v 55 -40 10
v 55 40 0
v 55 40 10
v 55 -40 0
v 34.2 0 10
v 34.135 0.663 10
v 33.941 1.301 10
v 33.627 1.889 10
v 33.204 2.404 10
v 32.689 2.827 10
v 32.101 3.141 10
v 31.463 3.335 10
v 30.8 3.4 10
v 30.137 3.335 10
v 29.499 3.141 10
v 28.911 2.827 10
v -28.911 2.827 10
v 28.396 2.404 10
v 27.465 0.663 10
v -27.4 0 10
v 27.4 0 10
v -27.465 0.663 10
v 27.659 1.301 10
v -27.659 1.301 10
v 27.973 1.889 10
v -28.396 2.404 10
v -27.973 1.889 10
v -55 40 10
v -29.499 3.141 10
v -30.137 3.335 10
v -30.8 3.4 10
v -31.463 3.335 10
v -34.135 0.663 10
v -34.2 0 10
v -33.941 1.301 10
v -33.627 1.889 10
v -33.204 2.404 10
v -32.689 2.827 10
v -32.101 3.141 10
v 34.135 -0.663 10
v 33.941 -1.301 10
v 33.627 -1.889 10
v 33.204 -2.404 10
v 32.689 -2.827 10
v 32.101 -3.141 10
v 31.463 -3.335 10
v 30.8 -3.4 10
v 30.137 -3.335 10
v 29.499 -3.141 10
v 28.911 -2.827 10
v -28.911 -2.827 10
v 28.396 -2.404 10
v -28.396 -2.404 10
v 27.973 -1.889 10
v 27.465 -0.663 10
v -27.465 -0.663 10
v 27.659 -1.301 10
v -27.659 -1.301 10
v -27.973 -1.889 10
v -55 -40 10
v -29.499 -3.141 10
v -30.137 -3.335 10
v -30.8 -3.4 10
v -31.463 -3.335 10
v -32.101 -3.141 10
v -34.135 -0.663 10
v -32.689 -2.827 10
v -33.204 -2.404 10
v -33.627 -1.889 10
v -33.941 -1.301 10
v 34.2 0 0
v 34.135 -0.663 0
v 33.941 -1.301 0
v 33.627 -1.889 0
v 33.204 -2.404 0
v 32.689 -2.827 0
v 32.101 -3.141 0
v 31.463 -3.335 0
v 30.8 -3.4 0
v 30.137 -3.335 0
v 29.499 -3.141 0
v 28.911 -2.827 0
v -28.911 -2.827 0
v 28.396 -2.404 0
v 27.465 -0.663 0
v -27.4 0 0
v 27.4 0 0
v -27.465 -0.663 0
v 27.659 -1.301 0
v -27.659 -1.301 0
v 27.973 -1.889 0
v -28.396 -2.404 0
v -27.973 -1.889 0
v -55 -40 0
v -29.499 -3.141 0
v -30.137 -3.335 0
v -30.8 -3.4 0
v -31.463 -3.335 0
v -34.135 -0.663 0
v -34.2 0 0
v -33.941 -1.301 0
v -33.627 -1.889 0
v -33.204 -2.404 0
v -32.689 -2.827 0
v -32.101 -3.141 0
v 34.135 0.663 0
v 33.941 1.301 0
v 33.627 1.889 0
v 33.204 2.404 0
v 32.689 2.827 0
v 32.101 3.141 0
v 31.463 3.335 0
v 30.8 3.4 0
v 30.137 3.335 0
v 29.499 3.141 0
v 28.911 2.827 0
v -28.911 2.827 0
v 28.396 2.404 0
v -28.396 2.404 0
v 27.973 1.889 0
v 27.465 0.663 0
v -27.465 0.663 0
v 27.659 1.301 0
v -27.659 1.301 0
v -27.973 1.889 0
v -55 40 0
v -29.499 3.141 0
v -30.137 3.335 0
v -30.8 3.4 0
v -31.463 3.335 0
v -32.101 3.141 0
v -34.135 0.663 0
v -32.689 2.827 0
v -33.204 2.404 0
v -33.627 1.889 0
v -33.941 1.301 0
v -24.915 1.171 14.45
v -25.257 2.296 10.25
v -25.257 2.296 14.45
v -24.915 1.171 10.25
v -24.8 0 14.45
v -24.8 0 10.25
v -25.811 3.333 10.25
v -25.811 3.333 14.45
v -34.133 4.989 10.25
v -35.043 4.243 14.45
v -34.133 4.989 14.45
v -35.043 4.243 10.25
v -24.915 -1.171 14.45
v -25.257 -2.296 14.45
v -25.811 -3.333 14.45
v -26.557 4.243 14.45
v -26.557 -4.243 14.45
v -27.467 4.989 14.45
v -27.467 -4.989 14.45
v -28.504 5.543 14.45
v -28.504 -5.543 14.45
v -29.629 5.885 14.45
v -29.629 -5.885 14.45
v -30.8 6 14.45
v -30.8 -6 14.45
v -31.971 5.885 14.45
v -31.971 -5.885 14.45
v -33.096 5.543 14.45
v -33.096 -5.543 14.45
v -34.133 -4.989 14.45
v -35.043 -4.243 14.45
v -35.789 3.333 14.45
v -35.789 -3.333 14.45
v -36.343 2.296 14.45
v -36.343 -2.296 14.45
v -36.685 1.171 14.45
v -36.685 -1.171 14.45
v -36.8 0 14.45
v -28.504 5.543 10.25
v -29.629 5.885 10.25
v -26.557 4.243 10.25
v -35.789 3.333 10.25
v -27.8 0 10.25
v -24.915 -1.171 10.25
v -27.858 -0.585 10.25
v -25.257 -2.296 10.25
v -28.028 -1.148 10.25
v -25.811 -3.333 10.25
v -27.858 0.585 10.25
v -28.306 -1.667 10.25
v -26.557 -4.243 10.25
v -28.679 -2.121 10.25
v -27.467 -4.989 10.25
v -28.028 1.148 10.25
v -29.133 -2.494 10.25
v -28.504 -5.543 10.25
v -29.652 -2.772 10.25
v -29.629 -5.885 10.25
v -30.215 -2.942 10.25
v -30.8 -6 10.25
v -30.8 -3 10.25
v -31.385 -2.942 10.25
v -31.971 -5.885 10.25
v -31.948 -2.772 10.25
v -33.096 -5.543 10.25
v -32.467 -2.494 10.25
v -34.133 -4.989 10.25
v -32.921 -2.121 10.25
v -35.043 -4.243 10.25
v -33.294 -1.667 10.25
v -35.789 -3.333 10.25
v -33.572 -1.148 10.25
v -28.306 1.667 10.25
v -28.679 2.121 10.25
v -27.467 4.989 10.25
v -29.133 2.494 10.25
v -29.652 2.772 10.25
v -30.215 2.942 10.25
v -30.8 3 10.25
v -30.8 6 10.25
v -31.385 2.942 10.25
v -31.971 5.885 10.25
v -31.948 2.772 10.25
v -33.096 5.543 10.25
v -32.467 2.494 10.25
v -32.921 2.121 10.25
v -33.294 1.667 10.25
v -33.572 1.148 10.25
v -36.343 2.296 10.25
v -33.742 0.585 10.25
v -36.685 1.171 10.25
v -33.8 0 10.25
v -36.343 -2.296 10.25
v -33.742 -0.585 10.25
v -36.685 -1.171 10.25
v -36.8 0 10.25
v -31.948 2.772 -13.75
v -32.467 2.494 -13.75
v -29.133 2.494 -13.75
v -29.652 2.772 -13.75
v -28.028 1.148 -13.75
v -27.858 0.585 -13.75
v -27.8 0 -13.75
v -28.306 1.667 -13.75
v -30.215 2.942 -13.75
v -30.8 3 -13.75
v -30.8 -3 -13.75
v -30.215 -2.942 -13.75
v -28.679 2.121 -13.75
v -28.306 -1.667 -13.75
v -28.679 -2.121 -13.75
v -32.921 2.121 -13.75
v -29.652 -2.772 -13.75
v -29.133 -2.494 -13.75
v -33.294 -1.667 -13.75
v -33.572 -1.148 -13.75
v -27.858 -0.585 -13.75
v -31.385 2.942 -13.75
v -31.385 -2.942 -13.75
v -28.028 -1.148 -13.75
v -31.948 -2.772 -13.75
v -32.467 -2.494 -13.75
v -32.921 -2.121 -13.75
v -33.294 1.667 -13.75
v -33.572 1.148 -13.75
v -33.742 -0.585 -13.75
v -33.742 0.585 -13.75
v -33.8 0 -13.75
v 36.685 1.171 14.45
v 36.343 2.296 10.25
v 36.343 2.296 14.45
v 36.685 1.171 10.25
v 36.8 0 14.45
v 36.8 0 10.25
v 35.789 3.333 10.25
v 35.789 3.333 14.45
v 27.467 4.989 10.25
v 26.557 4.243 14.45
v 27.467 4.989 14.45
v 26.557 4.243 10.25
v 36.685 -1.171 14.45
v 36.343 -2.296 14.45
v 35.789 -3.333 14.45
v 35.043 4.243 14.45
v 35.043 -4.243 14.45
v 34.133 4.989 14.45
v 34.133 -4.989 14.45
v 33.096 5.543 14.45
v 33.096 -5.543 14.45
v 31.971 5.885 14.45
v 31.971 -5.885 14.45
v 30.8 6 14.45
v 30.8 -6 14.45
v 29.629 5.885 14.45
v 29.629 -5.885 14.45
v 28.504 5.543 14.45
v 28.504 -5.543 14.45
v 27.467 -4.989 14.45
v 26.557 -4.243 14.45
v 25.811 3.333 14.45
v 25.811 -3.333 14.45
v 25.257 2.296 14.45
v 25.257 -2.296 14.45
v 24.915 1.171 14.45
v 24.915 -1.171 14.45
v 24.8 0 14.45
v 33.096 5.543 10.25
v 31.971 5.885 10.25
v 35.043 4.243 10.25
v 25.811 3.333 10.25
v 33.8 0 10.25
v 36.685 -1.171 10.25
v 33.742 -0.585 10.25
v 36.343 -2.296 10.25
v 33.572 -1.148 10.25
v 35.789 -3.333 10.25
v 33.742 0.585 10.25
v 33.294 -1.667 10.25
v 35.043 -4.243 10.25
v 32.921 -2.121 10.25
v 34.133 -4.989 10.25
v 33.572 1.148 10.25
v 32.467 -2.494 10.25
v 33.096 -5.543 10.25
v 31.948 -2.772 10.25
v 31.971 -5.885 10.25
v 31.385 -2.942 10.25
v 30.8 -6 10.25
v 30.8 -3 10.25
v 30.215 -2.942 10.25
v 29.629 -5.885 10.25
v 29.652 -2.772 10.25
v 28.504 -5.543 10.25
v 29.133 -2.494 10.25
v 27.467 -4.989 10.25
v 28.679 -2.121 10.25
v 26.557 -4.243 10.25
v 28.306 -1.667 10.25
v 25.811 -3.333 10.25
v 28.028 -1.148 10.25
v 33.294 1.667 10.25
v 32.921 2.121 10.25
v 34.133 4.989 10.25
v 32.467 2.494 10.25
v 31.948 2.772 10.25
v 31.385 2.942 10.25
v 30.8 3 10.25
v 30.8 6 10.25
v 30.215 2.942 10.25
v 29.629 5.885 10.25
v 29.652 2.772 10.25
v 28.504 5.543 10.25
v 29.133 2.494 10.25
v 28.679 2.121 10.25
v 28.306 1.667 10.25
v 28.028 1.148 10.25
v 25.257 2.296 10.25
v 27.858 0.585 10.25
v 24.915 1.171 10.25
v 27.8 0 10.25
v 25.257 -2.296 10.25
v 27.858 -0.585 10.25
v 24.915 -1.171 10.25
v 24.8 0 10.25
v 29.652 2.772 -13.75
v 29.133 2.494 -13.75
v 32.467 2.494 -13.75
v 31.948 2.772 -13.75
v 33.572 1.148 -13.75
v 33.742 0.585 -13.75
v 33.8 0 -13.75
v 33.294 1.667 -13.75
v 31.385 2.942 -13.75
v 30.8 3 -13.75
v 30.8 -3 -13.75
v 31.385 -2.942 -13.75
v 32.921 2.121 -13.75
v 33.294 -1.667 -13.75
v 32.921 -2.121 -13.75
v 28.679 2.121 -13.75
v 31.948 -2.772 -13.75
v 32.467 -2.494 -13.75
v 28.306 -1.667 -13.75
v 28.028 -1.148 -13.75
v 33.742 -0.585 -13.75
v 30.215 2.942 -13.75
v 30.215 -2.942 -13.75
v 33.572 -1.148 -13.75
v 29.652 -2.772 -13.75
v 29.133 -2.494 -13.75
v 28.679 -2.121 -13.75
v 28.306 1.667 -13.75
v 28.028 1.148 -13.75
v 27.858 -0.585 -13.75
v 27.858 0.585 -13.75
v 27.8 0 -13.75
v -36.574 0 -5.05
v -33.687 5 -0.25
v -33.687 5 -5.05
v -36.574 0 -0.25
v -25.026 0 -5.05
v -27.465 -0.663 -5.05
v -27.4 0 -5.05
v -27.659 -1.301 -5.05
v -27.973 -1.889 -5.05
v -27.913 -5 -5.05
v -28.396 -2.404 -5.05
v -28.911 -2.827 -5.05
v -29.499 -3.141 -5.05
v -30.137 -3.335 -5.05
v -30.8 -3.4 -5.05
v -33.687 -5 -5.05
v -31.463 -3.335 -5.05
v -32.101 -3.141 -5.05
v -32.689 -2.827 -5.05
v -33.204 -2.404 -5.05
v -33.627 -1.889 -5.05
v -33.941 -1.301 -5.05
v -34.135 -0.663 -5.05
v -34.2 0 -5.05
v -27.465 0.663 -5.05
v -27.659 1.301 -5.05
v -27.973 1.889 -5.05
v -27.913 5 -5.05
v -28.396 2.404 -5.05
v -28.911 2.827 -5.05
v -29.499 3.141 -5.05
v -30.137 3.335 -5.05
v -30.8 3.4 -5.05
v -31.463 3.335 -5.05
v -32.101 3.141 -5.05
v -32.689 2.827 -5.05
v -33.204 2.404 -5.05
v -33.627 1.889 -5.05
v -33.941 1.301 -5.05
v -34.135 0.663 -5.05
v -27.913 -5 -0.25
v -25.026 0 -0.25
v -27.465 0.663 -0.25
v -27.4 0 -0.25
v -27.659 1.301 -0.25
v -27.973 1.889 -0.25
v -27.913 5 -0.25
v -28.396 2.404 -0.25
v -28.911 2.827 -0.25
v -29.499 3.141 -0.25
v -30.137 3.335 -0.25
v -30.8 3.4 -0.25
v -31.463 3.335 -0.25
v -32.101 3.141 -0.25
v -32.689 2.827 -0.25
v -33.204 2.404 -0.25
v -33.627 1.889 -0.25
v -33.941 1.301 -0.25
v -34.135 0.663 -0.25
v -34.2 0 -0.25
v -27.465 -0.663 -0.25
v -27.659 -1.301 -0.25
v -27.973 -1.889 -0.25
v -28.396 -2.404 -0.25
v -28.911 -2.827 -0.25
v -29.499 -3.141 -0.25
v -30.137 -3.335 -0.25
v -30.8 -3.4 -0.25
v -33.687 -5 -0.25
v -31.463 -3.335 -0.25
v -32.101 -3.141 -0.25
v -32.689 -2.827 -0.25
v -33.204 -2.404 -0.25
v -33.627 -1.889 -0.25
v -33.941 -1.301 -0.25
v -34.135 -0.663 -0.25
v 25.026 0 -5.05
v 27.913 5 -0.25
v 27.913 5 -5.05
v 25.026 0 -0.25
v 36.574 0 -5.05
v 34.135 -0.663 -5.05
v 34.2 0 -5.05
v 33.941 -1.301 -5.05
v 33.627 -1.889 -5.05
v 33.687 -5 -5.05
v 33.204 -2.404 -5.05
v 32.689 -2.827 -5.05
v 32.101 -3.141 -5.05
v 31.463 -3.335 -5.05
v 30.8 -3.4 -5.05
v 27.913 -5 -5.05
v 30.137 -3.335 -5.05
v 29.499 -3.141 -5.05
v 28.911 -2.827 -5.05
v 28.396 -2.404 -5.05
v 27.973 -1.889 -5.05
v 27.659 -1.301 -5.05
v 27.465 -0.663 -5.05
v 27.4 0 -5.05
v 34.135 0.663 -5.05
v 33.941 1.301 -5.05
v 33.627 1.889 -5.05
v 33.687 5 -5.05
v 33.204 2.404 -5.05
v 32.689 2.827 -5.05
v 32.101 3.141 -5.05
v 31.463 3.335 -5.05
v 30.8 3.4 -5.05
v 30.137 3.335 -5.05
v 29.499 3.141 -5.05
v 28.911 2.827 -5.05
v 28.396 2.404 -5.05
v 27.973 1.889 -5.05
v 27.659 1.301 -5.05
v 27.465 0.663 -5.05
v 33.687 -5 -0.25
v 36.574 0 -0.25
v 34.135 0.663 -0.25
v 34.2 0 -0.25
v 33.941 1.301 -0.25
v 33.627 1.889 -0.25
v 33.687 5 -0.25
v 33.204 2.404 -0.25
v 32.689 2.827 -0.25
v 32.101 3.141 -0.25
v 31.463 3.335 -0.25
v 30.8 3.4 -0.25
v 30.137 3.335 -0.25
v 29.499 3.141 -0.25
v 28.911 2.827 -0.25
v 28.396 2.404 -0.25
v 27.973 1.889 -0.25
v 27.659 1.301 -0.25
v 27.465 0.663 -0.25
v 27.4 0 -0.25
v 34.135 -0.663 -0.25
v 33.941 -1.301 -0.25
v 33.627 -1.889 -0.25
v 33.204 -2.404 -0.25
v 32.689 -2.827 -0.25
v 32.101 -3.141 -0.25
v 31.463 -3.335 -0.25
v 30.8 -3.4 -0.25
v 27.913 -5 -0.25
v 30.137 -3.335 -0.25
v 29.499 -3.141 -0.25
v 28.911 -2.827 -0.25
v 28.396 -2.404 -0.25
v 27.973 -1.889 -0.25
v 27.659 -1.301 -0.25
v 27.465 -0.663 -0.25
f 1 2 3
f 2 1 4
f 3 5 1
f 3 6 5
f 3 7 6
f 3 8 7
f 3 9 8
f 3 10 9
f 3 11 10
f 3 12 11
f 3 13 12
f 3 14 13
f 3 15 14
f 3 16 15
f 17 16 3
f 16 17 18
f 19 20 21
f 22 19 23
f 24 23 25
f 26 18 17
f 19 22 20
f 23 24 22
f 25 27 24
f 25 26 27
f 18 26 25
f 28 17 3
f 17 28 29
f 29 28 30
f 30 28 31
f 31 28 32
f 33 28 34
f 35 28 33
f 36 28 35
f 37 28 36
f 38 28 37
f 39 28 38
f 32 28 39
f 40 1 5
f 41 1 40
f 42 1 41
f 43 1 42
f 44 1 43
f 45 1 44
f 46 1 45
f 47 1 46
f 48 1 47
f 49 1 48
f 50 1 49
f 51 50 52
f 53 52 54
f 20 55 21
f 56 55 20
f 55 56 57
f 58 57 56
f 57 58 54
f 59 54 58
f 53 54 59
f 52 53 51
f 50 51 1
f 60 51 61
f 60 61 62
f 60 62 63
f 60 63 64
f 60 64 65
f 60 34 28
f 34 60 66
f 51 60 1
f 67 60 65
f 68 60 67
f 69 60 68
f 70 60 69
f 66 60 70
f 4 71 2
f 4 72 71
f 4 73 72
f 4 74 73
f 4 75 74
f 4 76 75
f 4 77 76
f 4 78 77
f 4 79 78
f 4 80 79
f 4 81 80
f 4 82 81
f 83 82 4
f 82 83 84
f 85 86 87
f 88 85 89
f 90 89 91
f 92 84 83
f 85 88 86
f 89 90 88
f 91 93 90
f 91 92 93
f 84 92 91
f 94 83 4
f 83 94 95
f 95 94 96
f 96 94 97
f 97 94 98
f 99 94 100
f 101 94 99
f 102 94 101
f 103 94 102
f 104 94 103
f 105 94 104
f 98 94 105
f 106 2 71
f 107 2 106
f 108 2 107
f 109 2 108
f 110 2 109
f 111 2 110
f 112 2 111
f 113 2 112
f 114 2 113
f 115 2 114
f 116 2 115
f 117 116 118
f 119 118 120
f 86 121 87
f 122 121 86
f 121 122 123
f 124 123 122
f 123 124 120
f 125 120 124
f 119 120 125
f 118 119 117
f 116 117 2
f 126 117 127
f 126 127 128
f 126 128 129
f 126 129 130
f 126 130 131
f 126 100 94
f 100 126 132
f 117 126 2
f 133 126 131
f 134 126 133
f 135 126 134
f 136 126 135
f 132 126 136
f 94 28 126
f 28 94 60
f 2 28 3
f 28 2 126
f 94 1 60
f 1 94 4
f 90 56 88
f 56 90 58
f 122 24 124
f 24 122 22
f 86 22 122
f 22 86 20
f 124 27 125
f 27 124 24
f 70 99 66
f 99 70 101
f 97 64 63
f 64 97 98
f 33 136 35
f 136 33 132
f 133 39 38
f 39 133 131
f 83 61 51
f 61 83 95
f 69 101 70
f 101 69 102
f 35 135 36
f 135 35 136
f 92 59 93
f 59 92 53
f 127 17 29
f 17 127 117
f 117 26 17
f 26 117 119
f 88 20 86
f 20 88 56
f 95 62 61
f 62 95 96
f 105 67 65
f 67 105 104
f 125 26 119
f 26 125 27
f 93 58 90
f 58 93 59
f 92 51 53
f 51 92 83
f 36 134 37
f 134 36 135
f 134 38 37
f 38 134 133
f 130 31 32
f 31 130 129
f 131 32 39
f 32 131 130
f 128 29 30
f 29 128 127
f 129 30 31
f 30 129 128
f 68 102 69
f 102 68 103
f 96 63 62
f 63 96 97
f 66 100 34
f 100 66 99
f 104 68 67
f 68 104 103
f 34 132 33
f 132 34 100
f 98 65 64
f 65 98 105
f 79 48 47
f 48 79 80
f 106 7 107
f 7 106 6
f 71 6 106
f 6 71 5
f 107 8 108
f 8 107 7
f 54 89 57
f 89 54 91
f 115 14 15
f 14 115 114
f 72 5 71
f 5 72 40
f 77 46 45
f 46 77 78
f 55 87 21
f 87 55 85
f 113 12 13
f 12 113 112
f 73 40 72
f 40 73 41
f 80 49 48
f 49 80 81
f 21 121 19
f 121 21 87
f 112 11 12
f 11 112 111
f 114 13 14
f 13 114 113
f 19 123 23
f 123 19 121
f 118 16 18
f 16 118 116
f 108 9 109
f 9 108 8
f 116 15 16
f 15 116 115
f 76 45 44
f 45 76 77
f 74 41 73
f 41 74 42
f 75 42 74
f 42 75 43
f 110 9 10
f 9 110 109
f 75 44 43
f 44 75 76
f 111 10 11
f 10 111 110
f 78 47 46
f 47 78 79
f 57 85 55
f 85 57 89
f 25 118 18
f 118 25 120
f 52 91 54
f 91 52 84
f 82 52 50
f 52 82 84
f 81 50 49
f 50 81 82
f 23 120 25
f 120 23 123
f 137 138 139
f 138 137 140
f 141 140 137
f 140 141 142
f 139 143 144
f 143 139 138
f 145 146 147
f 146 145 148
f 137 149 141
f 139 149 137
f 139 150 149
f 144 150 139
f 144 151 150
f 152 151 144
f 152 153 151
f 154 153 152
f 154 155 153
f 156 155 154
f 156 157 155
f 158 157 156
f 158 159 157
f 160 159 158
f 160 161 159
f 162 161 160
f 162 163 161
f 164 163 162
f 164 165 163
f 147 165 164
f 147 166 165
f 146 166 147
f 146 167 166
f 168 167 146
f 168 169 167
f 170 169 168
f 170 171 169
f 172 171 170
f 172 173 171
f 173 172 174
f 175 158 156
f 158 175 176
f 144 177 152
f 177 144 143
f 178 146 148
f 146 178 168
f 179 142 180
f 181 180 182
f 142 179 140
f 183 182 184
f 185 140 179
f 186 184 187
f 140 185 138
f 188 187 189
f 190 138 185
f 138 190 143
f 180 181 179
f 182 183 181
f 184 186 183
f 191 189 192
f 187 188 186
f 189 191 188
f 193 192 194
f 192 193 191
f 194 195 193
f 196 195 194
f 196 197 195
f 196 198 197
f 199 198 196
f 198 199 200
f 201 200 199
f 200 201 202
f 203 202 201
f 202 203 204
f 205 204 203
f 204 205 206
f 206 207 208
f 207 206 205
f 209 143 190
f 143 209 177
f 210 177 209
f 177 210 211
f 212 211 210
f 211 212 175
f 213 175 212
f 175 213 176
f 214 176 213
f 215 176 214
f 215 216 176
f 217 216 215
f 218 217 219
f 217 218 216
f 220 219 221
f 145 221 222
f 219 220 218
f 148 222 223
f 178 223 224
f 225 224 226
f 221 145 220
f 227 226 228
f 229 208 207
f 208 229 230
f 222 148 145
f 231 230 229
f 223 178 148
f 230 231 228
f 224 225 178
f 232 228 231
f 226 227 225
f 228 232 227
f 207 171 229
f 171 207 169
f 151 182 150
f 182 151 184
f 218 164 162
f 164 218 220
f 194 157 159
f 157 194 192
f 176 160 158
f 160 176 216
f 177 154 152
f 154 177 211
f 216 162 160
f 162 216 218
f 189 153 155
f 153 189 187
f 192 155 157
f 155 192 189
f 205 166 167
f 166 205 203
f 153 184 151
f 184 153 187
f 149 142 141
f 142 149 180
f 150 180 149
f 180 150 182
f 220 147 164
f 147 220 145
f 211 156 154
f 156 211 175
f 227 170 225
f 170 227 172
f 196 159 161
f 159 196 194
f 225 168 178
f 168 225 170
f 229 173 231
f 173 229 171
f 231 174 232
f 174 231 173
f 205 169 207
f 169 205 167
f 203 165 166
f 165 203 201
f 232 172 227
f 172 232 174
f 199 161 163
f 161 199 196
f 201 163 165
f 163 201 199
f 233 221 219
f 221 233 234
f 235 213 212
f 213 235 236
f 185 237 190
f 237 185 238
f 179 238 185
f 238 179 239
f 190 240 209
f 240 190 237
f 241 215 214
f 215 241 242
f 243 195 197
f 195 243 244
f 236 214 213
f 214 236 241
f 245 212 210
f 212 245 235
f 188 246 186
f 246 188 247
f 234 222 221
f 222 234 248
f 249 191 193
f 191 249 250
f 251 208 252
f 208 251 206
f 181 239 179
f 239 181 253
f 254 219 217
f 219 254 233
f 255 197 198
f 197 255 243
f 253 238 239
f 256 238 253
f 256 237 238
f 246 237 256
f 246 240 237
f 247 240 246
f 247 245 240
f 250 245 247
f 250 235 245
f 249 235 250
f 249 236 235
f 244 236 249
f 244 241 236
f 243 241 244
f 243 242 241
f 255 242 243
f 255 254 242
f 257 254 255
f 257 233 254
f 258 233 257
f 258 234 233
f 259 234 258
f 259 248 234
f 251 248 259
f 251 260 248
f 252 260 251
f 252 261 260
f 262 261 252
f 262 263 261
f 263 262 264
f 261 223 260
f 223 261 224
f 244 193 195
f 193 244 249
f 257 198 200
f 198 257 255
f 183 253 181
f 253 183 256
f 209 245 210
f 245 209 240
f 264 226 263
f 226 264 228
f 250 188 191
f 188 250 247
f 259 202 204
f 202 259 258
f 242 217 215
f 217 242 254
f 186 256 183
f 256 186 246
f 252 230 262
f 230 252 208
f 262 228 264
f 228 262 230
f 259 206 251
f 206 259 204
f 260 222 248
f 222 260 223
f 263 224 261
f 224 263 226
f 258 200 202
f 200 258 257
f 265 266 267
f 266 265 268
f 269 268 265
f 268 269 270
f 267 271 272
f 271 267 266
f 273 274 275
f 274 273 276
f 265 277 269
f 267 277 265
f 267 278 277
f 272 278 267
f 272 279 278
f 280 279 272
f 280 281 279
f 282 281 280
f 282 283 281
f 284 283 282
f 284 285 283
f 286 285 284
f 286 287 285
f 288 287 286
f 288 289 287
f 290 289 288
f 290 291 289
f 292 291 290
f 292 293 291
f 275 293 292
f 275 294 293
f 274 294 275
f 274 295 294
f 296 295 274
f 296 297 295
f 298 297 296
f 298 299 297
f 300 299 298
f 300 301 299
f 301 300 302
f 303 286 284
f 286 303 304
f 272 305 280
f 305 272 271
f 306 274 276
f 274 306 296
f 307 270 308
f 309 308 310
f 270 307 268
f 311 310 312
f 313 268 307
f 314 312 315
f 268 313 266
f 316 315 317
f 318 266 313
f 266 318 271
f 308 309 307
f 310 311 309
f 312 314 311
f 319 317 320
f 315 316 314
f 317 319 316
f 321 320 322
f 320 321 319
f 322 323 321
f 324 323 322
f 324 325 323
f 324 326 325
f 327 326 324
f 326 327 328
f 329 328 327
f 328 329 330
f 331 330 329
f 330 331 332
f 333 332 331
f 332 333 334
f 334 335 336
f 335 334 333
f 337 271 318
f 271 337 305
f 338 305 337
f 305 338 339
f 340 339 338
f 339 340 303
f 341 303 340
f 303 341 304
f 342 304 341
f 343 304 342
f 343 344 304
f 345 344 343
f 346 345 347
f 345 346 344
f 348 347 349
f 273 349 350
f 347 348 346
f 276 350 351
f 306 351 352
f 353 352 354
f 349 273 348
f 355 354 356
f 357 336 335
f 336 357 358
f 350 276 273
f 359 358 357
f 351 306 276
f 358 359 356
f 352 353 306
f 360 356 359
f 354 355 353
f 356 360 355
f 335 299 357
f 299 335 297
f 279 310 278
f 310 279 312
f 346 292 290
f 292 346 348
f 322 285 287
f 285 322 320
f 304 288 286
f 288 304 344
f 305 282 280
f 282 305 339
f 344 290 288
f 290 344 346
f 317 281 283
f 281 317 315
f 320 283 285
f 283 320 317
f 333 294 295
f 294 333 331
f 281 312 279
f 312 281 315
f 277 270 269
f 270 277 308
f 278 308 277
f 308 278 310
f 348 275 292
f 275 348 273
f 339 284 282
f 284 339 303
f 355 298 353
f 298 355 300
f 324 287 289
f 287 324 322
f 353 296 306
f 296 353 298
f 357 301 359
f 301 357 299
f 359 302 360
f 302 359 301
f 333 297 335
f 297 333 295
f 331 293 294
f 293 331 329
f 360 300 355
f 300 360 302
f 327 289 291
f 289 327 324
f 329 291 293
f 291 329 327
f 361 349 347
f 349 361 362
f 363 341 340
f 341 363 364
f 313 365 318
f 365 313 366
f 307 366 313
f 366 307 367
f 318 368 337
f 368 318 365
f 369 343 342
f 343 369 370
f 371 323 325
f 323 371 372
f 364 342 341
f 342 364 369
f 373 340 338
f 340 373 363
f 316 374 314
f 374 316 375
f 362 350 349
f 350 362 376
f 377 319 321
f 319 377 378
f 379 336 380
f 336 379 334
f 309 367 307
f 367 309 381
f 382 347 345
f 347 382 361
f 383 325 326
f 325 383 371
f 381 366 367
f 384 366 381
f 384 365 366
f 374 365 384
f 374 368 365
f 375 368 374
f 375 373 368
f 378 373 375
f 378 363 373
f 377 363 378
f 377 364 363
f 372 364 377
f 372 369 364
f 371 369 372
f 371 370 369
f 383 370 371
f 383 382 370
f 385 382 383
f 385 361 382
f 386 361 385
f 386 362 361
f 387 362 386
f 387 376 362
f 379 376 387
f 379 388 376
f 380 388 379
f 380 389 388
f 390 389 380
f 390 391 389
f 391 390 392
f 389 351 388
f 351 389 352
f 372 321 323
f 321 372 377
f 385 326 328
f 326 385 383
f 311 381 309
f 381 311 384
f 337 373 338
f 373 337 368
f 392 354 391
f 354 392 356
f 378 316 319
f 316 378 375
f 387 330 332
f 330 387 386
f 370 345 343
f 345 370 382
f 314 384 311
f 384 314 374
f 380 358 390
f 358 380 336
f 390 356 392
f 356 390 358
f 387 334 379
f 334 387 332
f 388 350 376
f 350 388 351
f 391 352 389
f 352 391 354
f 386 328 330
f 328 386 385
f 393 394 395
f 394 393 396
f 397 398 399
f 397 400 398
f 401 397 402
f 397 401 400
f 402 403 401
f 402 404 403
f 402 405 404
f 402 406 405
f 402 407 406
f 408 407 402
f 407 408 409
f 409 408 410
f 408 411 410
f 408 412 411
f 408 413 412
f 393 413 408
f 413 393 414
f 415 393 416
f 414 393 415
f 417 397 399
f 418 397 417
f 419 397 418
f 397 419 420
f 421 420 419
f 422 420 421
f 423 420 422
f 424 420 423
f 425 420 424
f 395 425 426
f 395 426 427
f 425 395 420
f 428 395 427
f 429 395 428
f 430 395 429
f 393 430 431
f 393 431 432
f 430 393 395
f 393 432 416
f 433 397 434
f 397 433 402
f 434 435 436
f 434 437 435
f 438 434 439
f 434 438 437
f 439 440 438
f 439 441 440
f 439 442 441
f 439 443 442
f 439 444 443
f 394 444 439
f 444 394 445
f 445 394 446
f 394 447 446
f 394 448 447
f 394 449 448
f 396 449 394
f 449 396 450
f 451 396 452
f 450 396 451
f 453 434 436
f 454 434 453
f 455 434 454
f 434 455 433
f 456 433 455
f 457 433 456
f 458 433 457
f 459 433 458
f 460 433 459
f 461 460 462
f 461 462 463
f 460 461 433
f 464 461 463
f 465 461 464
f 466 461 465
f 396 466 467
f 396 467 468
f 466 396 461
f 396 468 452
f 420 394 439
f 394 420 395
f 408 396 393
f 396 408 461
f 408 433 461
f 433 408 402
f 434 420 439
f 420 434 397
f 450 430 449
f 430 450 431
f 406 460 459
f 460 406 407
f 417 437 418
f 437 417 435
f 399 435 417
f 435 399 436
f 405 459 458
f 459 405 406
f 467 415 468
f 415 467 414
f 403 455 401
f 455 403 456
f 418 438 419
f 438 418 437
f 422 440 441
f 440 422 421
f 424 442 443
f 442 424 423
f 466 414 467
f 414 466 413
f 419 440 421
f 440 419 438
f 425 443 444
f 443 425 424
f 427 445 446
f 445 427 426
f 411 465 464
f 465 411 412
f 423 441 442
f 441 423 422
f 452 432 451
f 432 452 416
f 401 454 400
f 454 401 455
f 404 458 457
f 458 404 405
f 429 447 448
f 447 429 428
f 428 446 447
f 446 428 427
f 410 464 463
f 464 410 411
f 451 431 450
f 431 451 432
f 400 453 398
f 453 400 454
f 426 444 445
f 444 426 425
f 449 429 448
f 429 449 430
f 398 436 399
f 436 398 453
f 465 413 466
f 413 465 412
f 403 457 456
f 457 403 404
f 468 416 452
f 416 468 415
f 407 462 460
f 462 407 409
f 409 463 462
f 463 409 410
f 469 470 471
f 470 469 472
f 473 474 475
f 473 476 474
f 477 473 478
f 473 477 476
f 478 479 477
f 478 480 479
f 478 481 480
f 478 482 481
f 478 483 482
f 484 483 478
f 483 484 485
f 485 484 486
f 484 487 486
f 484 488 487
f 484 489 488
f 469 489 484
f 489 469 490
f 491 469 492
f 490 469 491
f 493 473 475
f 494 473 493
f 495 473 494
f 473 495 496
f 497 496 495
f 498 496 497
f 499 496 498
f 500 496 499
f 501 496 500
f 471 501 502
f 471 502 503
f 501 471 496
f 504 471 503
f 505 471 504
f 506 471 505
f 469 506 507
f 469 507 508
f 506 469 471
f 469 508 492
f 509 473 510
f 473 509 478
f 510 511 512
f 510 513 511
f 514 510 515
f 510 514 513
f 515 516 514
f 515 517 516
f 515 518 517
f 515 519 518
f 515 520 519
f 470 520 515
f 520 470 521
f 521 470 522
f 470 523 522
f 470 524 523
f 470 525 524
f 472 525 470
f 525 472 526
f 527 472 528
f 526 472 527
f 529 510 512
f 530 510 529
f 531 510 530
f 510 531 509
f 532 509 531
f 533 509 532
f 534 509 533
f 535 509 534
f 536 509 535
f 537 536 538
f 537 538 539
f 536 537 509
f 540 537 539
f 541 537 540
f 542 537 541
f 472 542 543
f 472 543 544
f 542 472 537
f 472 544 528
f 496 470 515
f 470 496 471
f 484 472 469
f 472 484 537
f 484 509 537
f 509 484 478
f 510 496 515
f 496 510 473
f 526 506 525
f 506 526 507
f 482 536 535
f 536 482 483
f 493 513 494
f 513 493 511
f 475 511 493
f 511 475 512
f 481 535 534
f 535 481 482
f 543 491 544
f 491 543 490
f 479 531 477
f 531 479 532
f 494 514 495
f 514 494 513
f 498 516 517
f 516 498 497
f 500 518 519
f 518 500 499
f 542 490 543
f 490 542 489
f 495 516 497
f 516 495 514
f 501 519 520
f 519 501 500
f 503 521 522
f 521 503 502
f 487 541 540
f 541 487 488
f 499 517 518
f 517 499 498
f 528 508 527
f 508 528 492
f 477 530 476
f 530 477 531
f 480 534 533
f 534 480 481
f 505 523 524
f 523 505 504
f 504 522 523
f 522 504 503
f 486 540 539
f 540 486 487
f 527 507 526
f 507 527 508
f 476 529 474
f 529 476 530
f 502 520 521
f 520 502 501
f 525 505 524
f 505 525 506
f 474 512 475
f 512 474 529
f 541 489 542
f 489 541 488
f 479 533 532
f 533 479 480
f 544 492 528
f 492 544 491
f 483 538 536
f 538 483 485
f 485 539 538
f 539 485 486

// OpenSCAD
$fn = 32;

// ------------------------------------------------------------------------
// Bolted plate: 110 x 80 x 10 mm plate, 2 fasteners
// Every part is its own module, assembly() places them once.
// ------------------------------------------------------------------------

// --- part 1 ---
module plate() {
  difference() {
    translate([-55, -40, 0]) cube([110, 80, 10]);
    translate([-30.8, 0, -1]) cylinder(h = 12, d = 6.8);
    translate([30.8, 0, -1]) cylinder(h = 12, d = 6.8);
  }
}

// --- part 2 ---
module bolt1() {
  cylinder(h = 4.2, d = 12);
  translate([0, 0, -24]) cylinder(h = 24, d = 6);
}

// --- part 3 ---
module bolt2() {
  cylinder(h = 4.2, d = 12);
  translate([0, 0, -24]) cylinder(h = 24, d = 6);
}

// --- part 4 ---
module nut1() {
  difference() {
    linear_extrude(height = 4.8) polygon(points = [[5.774, 0], [2.887, 5], [-2.887, 5], [-5.774, 0], [-2.887, -5], [2.887, -5]]);
    translate([0, 0, -1]) cylinder(h = 6.8, d = 6.8);
  }
}

// --- part 5 ---
module nut2() {
  difference() {
    linear_extrude(height = 4.8) polygon(points = [[5.774, 0], [2.887, 5], [-2.887, 5], [-5.774, 0], [-2.887, -5], [2.887, -5]]);
    translate([0, 0, -1]) cylinder(h = 6.8, d = 6.8);
  }
}

// --- assembly ---
module assembly() {
  translate([0, 0, 0]) rotate([0, 0, 0]) plate();
  translate([-30.8, 0, 10.25]) rotate([0, 0, 0]) bolt1();
  translate([30.8, 0, 10.25]) rotate([0, 0, 0]) bolt2();
  translate([-30.8, 0, -5.05]) rotate([0, 0, 0]) nut1();
  translate([30.8, 0, -5.05]) rotate([0, 0, 0]) nut2();
}

assembly();
